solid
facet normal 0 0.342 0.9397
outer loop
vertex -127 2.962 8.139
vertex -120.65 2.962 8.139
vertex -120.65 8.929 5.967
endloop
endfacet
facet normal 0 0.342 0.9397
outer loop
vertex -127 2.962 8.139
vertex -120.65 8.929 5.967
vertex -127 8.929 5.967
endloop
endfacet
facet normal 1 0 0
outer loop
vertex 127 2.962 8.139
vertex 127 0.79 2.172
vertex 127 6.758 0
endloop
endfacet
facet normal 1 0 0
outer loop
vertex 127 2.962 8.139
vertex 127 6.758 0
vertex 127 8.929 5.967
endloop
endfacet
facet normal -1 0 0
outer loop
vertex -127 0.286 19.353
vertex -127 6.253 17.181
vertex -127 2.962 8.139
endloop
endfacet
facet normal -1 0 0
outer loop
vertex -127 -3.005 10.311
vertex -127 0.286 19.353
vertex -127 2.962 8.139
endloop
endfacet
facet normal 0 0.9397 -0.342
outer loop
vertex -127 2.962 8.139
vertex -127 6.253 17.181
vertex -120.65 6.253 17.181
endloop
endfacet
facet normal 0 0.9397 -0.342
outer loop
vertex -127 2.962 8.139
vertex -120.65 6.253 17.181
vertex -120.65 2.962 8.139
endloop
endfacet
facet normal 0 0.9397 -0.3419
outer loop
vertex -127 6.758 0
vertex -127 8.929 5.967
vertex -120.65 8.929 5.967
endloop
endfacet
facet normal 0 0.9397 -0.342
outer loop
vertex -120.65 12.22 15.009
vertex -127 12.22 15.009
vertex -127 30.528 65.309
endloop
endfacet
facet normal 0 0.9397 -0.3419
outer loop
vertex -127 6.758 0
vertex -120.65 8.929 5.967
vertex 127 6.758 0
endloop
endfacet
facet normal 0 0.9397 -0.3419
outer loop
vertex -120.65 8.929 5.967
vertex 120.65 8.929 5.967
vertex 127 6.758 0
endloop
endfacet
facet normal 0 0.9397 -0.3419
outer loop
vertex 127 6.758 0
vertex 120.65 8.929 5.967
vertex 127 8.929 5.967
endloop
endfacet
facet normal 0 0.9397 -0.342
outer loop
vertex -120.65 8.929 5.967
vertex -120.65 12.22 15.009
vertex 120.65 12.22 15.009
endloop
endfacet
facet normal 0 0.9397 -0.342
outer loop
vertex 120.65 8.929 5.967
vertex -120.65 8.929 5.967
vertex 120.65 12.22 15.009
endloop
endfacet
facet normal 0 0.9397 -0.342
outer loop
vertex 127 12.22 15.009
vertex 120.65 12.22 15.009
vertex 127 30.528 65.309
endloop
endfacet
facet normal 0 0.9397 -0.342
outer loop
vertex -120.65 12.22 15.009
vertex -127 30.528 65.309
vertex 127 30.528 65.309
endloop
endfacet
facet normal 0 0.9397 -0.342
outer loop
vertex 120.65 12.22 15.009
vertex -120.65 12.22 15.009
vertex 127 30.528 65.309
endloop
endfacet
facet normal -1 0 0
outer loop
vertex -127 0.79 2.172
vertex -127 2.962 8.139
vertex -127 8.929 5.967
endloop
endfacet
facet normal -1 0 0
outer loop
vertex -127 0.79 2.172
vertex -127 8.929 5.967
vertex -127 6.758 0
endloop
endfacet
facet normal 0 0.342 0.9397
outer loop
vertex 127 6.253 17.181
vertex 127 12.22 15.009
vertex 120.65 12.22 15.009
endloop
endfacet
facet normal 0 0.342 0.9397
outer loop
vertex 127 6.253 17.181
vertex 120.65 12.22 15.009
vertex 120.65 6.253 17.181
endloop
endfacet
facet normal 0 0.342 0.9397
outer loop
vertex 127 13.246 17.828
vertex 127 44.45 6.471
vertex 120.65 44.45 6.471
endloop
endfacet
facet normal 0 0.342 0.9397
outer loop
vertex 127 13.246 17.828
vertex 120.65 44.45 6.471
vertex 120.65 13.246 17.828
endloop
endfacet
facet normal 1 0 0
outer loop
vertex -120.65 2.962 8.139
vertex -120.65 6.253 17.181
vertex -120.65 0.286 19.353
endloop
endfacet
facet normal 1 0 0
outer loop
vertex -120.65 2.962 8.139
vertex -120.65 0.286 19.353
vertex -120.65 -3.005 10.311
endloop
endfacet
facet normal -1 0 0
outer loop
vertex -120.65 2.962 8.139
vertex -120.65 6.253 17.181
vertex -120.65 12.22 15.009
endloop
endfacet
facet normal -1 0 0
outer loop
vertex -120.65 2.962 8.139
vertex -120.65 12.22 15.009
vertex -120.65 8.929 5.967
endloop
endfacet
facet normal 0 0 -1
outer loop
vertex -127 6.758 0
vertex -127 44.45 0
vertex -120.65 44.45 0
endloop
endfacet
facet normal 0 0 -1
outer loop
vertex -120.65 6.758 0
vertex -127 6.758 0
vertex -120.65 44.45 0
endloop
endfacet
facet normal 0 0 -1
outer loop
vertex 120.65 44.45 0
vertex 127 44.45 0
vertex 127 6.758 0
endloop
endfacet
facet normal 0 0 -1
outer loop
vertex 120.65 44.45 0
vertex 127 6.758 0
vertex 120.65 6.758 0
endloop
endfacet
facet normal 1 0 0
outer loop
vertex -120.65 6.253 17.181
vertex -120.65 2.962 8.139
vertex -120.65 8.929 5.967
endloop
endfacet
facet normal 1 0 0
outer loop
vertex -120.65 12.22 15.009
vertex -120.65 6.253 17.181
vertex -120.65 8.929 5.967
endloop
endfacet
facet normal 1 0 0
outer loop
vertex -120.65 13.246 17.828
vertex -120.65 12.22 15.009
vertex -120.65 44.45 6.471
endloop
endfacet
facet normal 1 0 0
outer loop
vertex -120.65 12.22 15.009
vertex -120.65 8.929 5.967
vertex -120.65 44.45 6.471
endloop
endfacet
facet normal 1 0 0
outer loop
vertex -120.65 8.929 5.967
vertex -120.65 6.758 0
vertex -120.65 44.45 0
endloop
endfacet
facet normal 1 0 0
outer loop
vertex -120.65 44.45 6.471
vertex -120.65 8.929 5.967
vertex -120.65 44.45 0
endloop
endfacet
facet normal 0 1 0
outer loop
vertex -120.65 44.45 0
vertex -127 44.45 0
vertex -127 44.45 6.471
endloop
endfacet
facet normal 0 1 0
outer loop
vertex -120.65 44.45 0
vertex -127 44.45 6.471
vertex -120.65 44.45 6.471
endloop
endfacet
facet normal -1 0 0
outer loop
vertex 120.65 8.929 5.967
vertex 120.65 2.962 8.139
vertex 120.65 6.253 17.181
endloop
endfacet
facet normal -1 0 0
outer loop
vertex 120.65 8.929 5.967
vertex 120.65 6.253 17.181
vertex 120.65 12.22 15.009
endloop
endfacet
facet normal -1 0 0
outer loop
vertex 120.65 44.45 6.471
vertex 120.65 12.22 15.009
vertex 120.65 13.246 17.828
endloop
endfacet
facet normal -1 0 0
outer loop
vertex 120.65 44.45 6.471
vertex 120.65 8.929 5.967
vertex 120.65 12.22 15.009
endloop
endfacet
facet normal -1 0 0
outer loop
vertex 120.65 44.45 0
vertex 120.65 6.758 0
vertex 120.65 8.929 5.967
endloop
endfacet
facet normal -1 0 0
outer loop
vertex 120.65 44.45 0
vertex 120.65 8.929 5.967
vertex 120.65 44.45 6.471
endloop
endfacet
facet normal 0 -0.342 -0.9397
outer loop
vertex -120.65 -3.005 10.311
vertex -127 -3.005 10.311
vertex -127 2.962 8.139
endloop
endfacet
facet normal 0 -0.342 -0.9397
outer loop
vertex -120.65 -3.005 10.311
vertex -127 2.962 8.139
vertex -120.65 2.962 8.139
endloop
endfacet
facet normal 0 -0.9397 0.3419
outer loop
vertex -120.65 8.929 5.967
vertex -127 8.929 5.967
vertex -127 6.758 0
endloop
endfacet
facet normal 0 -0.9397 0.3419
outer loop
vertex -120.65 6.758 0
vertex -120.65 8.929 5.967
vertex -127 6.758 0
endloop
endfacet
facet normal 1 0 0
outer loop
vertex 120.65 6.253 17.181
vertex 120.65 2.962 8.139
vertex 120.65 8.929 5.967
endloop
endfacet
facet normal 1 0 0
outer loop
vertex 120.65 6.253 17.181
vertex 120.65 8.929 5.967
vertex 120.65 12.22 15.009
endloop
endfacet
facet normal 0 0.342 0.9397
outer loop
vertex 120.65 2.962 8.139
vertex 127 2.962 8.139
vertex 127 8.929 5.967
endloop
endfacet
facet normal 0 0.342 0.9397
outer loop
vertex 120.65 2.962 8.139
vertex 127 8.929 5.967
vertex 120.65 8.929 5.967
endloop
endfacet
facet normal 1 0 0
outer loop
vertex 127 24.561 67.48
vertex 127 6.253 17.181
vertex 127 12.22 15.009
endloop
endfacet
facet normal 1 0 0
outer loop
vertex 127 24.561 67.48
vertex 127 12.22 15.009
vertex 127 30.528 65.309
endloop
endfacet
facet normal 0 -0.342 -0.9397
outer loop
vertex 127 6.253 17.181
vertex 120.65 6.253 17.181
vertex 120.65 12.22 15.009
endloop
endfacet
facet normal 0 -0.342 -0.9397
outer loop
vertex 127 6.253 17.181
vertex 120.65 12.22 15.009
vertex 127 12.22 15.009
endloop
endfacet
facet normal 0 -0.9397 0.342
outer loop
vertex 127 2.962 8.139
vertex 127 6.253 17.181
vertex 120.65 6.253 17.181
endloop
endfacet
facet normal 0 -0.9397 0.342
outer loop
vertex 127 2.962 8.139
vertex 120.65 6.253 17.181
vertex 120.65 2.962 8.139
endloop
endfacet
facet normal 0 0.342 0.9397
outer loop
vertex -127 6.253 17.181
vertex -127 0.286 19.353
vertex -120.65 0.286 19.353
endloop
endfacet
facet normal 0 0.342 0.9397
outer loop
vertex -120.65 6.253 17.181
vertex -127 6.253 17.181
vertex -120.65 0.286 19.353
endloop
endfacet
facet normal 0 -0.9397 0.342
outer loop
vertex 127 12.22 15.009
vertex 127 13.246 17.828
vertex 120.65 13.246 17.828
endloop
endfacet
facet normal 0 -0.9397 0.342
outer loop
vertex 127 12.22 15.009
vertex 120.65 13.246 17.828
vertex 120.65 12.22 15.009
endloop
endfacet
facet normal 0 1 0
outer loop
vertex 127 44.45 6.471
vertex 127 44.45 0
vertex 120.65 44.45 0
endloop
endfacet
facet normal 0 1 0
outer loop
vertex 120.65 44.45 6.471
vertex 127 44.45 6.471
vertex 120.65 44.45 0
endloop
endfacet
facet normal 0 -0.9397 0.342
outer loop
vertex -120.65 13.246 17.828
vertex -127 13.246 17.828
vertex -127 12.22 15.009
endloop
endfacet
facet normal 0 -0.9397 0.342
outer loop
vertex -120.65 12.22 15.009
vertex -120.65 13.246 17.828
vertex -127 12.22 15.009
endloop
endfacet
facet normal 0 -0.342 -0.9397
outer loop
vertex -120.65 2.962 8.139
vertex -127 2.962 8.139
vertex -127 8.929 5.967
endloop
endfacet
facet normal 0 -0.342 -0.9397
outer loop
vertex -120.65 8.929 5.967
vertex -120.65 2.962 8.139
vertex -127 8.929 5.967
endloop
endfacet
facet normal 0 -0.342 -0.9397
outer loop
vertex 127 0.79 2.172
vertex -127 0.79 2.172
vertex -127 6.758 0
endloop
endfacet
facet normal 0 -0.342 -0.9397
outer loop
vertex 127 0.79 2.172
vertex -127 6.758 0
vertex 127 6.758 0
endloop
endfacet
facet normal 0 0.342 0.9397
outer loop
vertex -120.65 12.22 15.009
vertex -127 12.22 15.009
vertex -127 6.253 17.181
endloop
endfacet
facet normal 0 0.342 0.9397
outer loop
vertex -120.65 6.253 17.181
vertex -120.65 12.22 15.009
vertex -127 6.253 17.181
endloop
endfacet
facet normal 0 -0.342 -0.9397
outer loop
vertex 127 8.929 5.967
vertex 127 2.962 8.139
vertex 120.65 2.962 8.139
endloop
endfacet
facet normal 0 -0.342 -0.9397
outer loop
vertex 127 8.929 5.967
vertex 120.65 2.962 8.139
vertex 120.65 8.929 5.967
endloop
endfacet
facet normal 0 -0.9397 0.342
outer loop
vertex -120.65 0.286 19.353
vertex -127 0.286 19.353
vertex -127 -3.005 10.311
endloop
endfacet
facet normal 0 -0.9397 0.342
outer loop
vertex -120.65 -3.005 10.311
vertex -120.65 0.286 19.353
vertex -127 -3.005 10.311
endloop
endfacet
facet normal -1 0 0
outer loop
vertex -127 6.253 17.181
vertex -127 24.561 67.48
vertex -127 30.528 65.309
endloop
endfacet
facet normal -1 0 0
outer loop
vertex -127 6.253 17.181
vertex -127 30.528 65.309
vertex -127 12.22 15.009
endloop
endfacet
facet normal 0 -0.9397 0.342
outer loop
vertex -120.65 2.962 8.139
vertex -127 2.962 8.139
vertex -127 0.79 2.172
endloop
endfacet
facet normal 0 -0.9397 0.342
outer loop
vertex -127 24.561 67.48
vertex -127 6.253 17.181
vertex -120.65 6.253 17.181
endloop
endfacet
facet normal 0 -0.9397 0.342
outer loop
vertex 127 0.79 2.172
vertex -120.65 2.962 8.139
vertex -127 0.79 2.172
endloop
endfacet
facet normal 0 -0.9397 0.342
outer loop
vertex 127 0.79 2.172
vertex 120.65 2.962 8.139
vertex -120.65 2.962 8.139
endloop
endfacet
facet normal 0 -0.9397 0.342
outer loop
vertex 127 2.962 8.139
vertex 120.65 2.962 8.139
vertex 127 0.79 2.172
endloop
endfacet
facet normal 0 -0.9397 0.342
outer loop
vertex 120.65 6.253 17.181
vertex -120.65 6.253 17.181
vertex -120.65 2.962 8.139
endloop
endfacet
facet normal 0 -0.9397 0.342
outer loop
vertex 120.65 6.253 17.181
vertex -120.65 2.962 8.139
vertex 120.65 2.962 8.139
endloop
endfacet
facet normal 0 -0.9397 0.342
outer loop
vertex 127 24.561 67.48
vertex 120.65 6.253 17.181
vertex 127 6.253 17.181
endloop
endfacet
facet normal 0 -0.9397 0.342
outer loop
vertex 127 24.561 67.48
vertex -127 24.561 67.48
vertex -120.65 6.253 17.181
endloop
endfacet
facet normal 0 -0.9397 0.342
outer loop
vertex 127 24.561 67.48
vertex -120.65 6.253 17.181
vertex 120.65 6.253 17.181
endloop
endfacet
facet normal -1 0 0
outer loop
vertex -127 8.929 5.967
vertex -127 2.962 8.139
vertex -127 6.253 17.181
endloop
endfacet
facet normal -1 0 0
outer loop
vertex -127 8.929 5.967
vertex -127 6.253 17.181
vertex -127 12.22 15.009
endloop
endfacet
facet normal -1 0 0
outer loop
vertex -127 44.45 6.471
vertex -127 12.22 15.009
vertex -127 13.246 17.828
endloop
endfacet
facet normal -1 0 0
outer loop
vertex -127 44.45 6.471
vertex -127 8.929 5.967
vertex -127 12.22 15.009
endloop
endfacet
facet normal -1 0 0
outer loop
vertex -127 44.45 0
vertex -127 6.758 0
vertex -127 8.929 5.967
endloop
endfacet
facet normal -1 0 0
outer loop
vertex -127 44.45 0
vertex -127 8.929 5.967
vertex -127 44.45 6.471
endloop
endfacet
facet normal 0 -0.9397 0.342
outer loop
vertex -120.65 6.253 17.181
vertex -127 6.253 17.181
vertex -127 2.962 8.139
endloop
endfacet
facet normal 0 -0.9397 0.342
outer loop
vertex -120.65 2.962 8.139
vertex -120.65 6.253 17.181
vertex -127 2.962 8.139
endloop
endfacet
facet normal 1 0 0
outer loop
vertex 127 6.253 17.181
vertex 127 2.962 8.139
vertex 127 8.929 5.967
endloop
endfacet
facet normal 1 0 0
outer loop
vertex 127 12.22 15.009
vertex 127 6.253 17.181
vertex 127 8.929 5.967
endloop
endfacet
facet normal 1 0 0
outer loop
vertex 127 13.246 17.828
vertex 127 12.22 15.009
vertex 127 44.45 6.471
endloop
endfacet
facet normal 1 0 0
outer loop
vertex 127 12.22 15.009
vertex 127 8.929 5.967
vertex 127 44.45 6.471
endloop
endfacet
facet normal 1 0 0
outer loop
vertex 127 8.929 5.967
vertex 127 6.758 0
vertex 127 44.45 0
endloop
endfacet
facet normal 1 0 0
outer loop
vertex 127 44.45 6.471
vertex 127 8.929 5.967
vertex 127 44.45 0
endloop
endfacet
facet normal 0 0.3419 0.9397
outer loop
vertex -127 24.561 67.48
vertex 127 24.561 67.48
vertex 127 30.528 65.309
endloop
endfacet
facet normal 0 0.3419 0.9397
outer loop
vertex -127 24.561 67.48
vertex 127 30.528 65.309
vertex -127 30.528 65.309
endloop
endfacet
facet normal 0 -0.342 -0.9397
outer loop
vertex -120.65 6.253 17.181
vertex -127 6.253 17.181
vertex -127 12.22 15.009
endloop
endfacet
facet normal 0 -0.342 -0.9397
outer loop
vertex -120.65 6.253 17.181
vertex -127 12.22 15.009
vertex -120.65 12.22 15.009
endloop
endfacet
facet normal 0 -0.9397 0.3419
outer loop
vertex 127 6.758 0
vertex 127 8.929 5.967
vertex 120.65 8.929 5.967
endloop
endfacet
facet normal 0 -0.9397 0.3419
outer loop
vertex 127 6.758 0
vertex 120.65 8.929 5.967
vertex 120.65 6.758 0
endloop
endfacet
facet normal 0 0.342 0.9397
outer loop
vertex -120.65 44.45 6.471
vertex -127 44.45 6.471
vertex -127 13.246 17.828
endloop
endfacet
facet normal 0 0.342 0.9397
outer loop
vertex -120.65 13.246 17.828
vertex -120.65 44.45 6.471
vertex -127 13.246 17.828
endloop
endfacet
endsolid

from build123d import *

# Parameters (mm, degrees)
F0_W     = 6.35
F0_H     = 44.45
F1_DEPTH = 20
F3_DEPTH = 6.35
F6_DEPTH = 6.35
F7_DEPTH = 6.35


# Not quite as in the source:
# - a feature names something its author has since deleted; it is built from what else it names


with BuildPart() as f1:
    # F0 (on Top) → F1 (new body)
    with BuildSketch(Plane.XY):
        with Locations((-123.825, 22.225)):
            Rectangle(F0_W, F0_H)
    extrude(amount=F1_DEPTH)

    # F2 (on face) → F3 (cut, through all)
    with BuildSketch(Plane(origin=(-127, 0, 0), x_dir=(0, -1, 0), z_dir=(-1, 0, 0))):
        Polygon((-13.2464528273, 17.8281720899), (-7.2794046853, 20), (-14.0369335405, 20), align=None)
        Polygon((0, 20), (-7.2794046853, 20), (-6.2533442553, 17.1809221376), (-2.9623086233, 8.1388760521), (-0.7904807132, 2.1718279101), (-6.7575288552, 0), (0, 0), align=None)
        Polygon((-44.45, 17.8281720899), (-13.2464528273, 17.8281720899), (-14.0369335405, 20), (-44.45, 20), align=None)
        Polygon((-44.45, 6.4710097155), (-13.2464528273, 17.8281720899), (-44.45, 17.8281720899), align=None)
        Polygon((-6.2533442553, 17.1809221376), (-7.2794046853, 20), (-13.2464528273, 17.8281720899), (-12.2203923973, 15.0090942275), align=None)
        Polygon((-0.7904807132, 2.1718279101), (-2.9623086233, 8.1388760521), (-8.9293567653, 5.967048142), (-6.7575288552, 0), align=None)
    extrude(amount=-F3_DEPTH, mode=Mode.SUBTRACT)


with BuildPart() as f4_1:
    # F4: instance of F1
    add(f1.part.mirror(Plane.YZ))


with BuildPart() as f6:
    # F5 (on face) → F6 (new body)
    with BuildSketch(Plane(origin=(0, 0, 0), x_dir=(1, 0, 0), z_dir=(0, -0.9396926208, 0.3420201433))):
        Polygon((127, 8.6612109876), (120.65, 8.6612109876), (120.65, 18.2835554495), (127, 18.2835554495), (127, 71.8112109876), (-127, 71.8112109876), (-127, 18.2835554495), (-120.65, 18.2835554495), (-120.65, 8.6612109876), (-127, 8.6612109876), (-127, 2.3112109876), (127, 2.3112109876), align=None)
    extrude(amount=-F6_DEPTH)


with BuildPart() as f7:
    # F7 (new): a face of the model
    f7_faces = [f1.part.faces().sort_by_distance(p)[0] for p in [
        (-123.825, 4.6078264393, 12.6598990949),
    ]]
    extrude(f7_faces, amount=F7_DEPTH)


solid = Compound([f1.part, f4_1.part, f6.part, f7.part])
